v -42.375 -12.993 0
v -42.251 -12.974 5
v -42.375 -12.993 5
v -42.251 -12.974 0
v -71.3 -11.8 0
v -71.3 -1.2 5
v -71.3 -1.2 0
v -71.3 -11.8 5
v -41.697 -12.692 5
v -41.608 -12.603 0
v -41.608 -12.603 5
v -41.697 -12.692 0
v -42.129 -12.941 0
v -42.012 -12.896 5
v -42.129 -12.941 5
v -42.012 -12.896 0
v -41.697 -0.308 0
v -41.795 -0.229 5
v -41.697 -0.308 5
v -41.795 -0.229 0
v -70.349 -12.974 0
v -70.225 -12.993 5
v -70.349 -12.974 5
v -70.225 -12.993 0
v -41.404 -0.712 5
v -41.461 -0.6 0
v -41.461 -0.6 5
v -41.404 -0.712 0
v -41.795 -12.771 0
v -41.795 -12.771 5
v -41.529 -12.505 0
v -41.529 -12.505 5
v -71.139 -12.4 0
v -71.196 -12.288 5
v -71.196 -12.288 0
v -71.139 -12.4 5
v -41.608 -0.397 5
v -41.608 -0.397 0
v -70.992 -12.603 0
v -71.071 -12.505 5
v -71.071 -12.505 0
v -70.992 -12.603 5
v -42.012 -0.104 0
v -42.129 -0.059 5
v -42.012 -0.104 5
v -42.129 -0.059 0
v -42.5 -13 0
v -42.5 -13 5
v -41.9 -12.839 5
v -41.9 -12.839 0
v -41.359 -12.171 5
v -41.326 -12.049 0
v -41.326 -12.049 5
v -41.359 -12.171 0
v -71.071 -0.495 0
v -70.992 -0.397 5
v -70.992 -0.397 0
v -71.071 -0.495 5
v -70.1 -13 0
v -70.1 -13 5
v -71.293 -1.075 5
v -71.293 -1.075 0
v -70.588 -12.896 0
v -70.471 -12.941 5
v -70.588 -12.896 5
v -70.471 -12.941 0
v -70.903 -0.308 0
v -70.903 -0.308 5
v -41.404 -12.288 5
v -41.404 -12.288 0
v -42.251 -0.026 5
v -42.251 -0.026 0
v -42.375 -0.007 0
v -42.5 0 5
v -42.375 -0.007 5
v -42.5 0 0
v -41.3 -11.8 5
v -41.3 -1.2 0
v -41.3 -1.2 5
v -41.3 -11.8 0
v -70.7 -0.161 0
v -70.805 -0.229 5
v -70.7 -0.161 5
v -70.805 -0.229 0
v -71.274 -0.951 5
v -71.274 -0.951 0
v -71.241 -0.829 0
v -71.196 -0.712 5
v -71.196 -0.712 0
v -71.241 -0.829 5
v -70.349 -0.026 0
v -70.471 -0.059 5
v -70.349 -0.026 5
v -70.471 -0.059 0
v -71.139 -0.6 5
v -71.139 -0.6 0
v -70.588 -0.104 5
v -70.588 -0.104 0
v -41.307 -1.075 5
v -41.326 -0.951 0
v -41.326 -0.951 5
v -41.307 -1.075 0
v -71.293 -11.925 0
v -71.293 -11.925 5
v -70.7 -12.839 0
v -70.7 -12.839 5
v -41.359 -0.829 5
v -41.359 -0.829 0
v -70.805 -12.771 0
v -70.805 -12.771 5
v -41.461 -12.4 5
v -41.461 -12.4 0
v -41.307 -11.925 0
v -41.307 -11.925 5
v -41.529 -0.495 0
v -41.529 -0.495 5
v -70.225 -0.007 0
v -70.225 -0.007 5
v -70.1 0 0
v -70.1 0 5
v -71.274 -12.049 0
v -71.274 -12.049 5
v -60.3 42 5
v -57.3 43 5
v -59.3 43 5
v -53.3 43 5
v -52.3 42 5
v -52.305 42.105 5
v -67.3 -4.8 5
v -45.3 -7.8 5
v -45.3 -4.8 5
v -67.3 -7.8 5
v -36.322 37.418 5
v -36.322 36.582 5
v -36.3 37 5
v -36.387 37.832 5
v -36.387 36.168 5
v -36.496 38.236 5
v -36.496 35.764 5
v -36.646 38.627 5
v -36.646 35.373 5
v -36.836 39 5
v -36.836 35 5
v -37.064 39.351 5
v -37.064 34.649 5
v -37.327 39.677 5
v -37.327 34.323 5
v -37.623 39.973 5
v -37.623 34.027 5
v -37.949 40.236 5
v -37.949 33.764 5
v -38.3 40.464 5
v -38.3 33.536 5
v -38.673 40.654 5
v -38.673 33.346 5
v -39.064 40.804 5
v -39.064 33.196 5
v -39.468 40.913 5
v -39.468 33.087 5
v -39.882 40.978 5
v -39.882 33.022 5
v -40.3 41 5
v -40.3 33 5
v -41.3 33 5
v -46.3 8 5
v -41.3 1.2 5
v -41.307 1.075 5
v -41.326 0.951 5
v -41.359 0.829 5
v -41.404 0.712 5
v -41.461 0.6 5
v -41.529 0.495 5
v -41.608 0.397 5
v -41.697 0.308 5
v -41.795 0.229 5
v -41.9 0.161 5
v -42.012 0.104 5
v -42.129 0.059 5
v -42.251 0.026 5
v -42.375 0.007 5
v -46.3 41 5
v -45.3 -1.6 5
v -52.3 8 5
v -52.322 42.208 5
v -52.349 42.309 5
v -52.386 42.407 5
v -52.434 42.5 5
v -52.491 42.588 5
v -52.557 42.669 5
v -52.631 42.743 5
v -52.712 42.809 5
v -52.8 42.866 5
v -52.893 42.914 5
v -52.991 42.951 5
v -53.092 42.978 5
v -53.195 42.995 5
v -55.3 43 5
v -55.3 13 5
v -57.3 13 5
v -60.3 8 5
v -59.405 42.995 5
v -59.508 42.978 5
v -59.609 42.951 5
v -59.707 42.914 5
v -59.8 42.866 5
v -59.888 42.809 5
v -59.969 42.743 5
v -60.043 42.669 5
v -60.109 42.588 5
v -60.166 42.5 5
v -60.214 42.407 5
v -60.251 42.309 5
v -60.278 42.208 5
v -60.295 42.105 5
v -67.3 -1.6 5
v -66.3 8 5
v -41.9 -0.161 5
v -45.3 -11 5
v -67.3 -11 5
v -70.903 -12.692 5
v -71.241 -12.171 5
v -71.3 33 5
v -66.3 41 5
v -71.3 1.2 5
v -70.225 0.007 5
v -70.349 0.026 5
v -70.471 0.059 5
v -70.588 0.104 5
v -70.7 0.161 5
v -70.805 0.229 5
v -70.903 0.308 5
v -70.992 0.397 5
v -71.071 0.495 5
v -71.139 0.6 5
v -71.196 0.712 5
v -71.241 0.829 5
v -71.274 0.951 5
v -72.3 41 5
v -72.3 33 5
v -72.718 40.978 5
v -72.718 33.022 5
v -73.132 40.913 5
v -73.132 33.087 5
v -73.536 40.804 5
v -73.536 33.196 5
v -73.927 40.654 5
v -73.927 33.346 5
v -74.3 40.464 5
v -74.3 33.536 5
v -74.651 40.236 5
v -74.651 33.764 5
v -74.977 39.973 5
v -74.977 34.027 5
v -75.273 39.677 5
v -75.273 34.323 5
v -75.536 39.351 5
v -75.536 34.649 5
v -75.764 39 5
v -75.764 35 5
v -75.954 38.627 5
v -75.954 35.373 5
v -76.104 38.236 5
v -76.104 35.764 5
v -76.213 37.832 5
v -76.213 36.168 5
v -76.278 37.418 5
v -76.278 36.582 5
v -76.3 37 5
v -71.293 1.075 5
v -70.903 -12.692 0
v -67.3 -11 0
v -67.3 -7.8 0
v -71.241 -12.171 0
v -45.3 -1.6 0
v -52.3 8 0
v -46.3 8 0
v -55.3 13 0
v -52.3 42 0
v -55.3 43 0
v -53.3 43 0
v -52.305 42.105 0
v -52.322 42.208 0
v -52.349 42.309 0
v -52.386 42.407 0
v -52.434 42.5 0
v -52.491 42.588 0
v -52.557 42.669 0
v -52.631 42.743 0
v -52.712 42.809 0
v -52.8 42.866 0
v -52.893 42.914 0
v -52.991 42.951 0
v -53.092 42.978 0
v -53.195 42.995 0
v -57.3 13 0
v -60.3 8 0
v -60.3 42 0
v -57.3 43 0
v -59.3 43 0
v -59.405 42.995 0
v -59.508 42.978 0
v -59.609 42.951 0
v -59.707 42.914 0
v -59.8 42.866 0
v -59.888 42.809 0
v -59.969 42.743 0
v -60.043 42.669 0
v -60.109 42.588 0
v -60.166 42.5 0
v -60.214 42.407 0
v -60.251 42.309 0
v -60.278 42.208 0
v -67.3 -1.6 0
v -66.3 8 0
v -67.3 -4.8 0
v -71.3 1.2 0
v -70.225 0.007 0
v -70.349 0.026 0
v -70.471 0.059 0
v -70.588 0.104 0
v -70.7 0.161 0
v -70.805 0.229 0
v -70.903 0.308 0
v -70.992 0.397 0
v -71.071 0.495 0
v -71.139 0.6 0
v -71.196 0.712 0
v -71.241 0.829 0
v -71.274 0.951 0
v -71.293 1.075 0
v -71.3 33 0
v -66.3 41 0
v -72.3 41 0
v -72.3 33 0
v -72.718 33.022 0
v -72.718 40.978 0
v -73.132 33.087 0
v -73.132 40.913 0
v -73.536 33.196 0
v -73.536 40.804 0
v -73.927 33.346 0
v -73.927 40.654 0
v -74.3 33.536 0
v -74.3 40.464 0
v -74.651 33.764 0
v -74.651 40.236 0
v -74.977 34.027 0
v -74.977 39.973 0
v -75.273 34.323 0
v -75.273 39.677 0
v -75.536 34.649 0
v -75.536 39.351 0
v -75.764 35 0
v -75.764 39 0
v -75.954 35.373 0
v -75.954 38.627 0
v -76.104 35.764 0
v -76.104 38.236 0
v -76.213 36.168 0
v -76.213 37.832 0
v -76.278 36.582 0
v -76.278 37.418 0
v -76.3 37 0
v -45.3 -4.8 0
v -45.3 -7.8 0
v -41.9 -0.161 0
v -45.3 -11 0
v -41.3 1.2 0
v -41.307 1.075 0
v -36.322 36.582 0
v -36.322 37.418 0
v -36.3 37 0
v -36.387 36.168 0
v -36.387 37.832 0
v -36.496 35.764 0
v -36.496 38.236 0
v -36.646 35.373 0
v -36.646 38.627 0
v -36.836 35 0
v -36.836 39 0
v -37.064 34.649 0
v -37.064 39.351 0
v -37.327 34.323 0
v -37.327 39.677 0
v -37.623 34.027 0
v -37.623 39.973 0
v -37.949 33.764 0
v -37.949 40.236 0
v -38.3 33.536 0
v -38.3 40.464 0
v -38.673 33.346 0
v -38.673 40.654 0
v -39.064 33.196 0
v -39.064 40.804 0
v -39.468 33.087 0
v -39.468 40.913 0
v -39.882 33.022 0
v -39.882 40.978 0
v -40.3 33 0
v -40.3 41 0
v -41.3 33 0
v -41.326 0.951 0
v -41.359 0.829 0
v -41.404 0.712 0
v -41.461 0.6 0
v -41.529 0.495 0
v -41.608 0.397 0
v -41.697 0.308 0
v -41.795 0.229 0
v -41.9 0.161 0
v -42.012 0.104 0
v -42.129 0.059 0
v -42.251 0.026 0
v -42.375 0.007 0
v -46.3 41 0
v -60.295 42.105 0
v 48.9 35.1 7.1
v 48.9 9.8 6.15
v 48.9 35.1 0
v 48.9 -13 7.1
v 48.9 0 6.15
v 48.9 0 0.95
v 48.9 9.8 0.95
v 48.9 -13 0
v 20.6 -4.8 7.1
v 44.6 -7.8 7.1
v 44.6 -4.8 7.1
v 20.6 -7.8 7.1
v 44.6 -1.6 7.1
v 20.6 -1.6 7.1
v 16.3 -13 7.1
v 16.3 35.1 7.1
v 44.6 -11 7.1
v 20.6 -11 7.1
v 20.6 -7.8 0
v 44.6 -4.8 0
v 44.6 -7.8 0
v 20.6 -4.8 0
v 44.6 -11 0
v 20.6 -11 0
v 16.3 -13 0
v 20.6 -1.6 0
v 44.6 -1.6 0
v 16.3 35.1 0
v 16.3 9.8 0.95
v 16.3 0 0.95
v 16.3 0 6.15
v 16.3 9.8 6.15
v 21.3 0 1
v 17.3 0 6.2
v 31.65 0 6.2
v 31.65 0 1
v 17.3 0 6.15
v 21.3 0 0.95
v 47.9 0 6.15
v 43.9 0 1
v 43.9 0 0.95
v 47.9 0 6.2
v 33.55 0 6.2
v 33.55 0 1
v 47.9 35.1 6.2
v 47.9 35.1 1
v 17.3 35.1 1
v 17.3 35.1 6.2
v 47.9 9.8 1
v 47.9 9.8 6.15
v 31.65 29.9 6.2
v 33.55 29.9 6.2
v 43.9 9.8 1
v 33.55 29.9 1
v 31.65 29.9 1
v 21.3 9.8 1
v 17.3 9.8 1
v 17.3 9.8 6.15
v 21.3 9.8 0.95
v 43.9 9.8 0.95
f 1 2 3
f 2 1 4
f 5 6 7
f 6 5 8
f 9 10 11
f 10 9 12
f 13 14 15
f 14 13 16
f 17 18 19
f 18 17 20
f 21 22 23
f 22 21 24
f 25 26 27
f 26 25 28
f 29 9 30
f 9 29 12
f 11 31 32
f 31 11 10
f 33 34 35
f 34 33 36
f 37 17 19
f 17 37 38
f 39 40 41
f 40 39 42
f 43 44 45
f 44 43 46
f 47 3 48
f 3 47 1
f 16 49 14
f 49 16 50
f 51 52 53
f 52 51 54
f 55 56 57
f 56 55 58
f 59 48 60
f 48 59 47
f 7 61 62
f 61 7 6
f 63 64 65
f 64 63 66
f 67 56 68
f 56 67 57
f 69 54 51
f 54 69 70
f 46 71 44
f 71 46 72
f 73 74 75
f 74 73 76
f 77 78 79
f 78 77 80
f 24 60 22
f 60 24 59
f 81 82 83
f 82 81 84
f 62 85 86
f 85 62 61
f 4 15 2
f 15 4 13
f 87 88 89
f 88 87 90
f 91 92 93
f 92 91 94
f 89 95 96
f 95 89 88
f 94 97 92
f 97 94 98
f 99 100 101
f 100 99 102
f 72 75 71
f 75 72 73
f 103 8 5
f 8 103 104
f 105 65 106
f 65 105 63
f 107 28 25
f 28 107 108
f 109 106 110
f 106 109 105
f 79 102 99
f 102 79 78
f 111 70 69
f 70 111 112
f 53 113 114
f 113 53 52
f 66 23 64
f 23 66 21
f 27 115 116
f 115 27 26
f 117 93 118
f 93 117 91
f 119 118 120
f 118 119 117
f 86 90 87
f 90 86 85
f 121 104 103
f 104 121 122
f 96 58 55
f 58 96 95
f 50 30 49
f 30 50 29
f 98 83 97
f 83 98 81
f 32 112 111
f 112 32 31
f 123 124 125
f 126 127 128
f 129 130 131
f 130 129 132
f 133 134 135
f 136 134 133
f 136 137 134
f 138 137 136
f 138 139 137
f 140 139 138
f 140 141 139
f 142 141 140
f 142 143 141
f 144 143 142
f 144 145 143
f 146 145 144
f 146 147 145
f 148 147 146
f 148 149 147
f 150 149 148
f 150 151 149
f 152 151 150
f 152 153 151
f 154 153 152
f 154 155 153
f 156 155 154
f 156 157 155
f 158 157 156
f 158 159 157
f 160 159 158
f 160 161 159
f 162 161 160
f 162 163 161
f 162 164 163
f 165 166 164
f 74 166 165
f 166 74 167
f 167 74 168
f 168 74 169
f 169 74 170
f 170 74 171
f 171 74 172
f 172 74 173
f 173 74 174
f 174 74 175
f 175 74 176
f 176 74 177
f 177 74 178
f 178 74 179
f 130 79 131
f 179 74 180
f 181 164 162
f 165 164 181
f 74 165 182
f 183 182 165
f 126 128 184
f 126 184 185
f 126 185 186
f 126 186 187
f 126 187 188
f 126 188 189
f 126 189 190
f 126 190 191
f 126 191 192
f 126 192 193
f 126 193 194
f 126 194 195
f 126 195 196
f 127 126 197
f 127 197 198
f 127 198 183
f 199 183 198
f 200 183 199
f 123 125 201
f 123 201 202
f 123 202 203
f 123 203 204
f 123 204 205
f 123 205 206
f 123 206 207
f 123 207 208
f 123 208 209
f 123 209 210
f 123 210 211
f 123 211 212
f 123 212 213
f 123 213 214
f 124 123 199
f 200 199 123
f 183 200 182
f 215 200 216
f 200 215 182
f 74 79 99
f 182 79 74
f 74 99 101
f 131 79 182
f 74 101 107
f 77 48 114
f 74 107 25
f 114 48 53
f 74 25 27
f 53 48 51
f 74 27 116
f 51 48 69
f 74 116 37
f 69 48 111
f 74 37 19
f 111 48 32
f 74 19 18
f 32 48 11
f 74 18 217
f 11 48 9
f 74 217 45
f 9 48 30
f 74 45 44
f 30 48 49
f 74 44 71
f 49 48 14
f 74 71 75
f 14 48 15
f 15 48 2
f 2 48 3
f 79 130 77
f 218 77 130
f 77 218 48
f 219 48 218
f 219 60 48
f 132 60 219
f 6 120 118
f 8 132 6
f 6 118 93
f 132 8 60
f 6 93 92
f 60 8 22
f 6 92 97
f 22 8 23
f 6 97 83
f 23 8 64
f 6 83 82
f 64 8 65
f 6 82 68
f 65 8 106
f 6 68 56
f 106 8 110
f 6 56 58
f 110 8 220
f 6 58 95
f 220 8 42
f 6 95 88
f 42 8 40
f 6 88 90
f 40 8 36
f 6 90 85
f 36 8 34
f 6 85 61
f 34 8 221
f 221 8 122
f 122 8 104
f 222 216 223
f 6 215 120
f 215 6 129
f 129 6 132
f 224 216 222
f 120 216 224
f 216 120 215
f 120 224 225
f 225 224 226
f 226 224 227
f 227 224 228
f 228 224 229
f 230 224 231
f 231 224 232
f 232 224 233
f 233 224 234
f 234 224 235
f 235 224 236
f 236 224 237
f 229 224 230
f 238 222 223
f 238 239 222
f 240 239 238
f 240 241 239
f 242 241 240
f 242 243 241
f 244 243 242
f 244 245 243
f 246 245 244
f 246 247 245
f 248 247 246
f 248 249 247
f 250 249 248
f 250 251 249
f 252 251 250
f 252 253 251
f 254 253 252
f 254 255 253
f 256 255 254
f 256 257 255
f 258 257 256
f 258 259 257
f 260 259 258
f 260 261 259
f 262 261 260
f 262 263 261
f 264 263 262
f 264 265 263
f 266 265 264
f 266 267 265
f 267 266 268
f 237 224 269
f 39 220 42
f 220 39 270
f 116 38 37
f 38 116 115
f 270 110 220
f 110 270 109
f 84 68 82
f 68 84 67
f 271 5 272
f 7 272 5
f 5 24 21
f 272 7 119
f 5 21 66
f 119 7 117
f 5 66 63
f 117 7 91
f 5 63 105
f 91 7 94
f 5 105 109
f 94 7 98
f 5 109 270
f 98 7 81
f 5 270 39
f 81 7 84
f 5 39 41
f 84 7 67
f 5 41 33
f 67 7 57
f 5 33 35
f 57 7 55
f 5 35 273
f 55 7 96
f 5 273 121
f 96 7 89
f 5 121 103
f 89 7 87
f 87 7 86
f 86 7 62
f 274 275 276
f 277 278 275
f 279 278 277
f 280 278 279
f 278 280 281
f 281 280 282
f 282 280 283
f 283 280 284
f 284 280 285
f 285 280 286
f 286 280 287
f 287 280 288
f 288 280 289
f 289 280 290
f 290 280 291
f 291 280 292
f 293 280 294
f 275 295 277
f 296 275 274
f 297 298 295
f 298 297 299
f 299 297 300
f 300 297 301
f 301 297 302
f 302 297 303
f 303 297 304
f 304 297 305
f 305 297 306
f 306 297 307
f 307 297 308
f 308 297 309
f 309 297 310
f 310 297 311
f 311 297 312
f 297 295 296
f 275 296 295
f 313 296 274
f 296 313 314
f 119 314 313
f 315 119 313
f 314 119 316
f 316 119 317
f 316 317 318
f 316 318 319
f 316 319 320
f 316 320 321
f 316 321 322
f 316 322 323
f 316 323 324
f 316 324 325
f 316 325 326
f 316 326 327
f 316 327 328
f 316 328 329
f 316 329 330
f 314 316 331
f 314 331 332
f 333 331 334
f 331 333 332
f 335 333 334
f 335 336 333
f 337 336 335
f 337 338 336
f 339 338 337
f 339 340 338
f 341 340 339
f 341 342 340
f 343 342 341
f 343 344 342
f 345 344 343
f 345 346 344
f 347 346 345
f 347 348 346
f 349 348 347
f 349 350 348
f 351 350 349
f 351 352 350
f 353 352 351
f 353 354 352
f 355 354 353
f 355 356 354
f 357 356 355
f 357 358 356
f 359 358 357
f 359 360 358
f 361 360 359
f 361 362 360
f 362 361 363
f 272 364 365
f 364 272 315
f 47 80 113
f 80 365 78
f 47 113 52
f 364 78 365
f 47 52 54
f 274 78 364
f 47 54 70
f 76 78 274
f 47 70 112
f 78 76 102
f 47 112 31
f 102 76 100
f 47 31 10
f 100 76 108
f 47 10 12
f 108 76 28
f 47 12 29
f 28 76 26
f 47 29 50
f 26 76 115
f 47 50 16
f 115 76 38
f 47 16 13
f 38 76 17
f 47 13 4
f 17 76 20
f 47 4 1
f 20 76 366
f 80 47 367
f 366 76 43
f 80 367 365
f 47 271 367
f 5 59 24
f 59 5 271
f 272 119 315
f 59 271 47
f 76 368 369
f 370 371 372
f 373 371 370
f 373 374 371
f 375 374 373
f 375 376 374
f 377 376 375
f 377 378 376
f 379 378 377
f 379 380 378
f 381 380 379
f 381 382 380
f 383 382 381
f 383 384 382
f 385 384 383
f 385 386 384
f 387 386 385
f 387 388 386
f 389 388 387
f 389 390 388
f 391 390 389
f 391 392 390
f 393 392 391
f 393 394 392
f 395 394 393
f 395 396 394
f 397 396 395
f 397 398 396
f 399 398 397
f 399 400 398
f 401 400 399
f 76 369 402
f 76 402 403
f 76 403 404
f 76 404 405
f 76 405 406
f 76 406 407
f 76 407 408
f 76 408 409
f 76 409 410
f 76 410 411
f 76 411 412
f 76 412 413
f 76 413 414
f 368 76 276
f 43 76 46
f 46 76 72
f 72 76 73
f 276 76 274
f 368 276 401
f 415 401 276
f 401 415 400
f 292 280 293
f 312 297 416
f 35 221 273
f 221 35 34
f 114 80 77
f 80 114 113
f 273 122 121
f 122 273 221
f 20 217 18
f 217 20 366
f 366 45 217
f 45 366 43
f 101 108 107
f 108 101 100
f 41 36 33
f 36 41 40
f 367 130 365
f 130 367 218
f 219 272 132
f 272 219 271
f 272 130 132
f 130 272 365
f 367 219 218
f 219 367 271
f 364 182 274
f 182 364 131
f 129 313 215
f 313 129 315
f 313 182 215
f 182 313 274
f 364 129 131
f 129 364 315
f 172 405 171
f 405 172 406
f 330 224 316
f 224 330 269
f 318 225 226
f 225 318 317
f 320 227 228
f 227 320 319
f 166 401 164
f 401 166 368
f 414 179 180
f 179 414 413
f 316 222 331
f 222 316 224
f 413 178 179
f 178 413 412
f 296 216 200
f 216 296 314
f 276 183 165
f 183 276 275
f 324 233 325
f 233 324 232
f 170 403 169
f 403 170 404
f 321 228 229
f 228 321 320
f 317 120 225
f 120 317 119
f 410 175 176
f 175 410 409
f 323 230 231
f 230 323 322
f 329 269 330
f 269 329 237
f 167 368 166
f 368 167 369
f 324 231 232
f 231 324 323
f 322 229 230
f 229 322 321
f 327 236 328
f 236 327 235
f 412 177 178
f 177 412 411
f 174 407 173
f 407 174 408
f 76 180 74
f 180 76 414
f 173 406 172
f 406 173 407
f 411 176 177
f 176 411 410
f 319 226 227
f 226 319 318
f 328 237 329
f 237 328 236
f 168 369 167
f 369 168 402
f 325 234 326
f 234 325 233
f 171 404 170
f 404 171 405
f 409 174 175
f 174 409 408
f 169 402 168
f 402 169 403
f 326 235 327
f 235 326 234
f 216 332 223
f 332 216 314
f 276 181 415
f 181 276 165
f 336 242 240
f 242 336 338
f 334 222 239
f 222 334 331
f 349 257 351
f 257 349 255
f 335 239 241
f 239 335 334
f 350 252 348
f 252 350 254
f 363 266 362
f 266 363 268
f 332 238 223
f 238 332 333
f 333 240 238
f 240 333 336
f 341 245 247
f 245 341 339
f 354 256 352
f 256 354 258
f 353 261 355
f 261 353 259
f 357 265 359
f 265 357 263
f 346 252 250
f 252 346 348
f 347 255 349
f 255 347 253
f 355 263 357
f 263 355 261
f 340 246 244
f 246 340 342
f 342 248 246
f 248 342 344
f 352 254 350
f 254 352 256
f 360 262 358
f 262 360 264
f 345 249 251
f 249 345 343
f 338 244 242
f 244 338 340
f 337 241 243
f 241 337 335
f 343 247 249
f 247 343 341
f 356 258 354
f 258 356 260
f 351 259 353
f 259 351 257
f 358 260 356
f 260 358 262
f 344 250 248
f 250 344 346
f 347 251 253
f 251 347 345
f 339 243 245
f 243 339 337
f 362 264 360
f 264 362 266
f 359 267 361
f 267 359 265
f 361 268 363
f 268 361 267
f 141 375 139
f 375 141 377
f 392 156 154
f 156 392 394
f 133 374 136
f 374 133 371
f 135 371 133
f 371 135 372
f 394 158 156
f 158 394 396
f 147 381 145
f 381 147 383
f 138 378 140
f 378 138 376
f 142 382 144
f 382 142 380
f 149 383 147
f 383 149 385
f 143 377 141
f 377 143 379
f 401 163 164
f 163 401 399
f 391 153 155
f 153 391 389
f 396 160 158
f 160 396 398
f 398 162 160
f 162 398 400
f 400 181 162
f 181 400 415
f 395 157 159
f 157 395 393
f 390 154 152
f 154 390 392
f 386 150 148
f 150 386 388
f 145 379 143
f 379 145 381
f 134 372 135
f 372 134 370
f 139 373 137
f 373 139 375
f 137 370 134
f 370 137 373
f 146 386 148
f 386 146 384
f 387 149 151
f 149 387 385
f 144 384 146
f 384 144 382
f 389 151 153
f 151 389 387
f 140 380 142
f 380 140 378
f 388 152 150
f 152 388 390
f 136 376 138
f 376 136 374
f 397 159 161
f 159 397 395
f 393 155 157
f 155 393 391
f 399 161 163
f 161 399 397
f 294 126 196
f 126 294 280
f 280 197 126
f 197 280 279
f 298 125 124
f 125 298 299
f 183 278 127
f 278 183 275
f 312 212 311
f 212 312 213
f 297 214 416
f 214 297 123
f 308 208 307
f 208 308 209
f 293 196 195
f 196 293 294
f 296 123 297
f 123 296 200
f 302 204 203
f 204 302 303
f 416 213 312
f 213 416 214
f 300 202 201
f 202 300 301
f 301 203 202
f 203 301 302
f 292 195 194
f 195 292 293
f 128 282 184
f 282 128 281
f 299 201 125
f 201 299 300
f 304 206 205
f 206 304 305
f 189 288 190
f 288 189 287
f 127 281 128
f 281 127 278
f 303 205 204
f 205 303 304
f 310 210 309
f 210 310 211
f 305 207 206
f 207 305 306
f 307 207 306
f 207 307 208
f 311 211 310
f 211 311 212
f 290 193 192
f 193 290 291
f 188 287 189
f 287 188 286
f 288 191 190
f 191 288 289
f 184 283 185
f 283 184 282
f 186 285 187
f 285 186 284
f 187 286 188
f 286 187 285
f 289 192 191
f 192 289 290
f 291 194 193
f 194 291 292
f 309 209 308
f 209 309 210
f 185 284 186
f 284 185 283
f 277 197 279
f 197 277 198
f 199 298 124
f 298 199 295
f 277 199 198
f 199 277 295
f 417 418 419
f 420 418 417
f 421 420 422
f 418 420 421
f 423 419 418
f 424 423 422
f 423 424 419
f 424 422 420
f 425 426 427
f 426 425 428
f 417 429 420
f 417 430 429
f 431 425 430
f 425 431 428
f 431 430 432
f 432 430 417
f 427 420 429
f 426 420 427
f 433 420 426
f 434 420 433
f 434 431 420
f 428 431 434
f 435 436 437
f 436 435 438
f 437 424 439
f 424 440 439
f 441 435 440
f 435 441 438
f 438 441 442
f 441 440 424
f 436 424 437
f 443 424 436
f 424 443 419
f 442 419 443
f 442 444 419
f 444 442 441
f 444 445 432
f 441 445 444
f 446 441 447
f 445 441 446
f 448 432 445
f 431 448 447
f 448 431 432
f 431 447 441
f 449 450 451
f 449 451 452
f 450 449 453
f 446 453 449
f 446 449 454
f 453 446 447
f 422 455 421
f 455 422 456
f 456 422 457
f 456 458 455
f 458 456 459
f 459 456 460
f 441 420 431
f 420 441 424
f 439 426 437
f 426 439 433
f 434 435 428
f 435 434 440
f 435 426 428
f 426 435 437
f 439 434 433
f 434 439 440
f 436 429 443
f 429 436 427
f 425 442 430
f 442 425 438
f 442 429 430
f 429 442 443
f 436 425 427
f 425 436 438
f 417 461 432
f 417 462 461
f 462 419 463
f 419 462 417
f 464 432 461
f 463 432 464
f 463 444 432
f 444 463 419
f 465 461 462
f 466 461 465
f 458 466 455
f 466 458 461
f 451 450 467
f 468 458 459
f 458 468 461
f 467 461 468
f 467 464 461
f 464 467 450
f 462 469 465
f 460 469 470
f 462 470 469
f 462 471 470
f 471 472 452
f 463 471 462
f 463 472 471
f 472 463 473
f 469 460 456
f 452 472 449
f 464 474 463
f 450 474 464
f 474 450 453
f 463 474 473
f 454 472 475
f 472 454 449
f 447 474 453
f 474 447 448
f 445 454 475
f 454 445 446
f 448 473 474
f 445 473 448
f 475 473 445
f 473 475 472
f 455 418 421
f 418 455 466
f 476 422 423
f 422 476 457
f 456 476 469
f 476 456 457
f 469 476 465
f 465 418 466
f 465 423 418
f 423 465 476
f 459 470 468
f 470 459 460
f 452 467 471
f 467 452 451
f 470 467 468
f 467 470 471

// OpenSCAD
// connector_combined.scad
// Combined snap buckle connector.
// Includes:
// - male connector with side arms and half-circle locking heads
// - female receiver with strap holder, center rail, and side locking holes

$fn = 60;


// ============================================================
// Preview layout
// ============================================================

preview_gap = 25;


// ============================================================
// Shared helper module
// ============================================================

module rounded_box(size=[10,10,4], r=1) {
    hull() {
        translate([r, r, 0])
            cylinder(h=size[2], r=r);

        translate([size[0]-r, r, 0])
            cylinder(h=size[2], r=r);

        translate([r, size[1]-r, 0])
            cylinder(h=size[2], r=r);

        translate([size[0]-r, size[1]-r, 0])
            cylinder(h=size[2], r=r);
    }
}


// ============================================================
// Male connector parameters
// ============================================================

male_thickness = 5;

male_base_width  = 30;
male_base_depth  = 8;


// ------------------------------------------------------------
// Male strap holder base
// ------------------------------------------------------------

male_strap_base_width = 30;
male_strap_base_height = 13;
male_strap_base_depth = 5;

male_strap_slot_width = 22;
male_strap_slot_height = 3.2;
male_strap_bar_height = 3;


// ------------------------------------------------------------
// Male side arms
// ------------------------------------------------------------

male_arm_width = 5;
male_arm_total_length = 34;


// ------------------------------------------------------------
// Male half-circle locking heads
// ------------------------------------------------------------

male_head_length = 6;
male_head_height = 8;

male_arm_body_length = male_arm_total_length - male_head_height;

male_head_overlap = 1.0;


// ------------------------------------------------------------
// Male center guide
// ------------------------------------------------------------

male_center_width = 8;
male_center_length = 35;

male_slot_width = 2;
male_slot_margin_bottom = 5;


// ------------------------------------------------------------
// Male general settings
// ------------------------------------------------------------

male_arm_overlap_into_base = 1.5;
male_rounding = 1.2;


// ============================================================
// Male locking head modules
// ============================================================

module left_half_circle_head_2d(length, height) {
    union() {
        // Flat part
        translate([-length, -height / 2])
            square([length, height]);

        // Rounded outside end
        translate([-length, 0])
            circle(d = height);
    }
}


module right_half_circle_head_2d(length, height) {
    union() {
        // Flat part
        translate([0, -height / 2])
            square([length, height]);

        // Rounded outside end
        translate([length, 0])
            circle(d = height);
    }
}


module left_half_circle_head(length, height, thickness) {
    linear_extrude(height = thickness)
        left_half_circle_head_2d(length, height);
}


module right_half_circle_head(length, height, thickness) {
    linear_extrude(height = thickness)
        right_half_circle_head_2d(length, height);
}


// ============================================================
// Male connector
// ============================================================

module male_connector() {

    difference() {

        union() {

            // Bag-style strap holder base
            difference() {
                translate([-male_strap_base_width / 2, -male_strap_base_height, 0])
                    rounded_box(
                        [
                            male_strap_base_width,
                            male_strap_base_height,
                            male_strap_base_depth
                        ],
                        r = male_rounding
                    );

                // First strap slot
                translate([
                    -male_strap_slot_width / 2,
                    -male_strap_base_height + 2,
                    -0.1
                ])
                    cube([
                        male_strap_slot_width,
                        male_strap_slot_height,
                        male_strap_base_depth + 0.2
                    ]);

                // Second strap slot
                translate([
                    -male_strap_slot_width / 2,
                    -male_strap_base_height + 2 + male_strap_slot_height + male_strap_bar_height,
                    -0.1
                ])
                    cube([
                        male_strap_slot_width,
                        male_strap_slot_height,
                        male_strap_base_depth + 0.2
                    ]);
            }


            // Front base bridge
            translate([-male_base_width / 2, 0, 0])
                rounded_box(
                    [
                        male_base_width,
                        male_base_depth,
                        male_thickness
                    ],
                    r = male_rounding
                );


            // Left flexible arm
            translate([
                -male_base_width / 2,
                male_base_depth - male_arm_overlap_into_base,
                0
            ])
                cube([
                    male_arm_width,
                    male_arm_body_length + male_arm_overlap_into_base,
                    male_thickness
                ]);


            // Right flexible arm
            translate([
                male_base_width / 2 - male_arm_width,
                male_base_depth - male_arm_overlap_into_base,
                0
            ])
                cube([
                    male_arm_width,
                    male_arm_body_length + male_arm_overlap_into_base,
                    male_thickness
                ]);


            // Left half-circle locking head
            translate([
                -male_base_width / 2 + male_arm_width,
                male_base_depth + male_arm_body_length - male_head_overlap + male_head_height / 2,
                0
            ])
                left_half_circle_head(
                    male_head_length,
                    male_head_height,
                    male_thickness
                );


            // Right half-circle locking head
            translate([
                male_base_width / 2 - male_arm_width,
                male_base_depth + male_arm_body_length - male_head_overlap + male_head_height / 2,
                0
            ])
                right_half_circle_head(
                    male_head_length,
                    male_head_height,
                    male_thickness
                );


            // Center guide
            translate([
                -male_center_width / 2,
                male_base_depth - male_arm_overlap_into_base,
                0
            ])
                rounded_box(
                    [
                        male_center_width,
                        male_center_length + male_arm_overlap_into_base,
                        male_thickness
                    ],
                    r = 1
                );
        }


        // Open-top straight slot in center guide
        translate([
            -male_slot_width / 2,
            male_base_depth + male_slot_margin_bottom,
            -0.1
        ])
            cube([
                male_slot_width,
                male_center_length + 5,
                male_thickness + 0.2
            ]);
    }
}


// ============================================================
// Female connector parameters
// ============================================================

female_main_width = 32.6;
female_main_height = 35.1;
female_main_depth = 7.1;


// ------------------------------------------------------------
// Female internal receiver cutout
// ------------------------------------------------------------

female_cut_width = 30.6;
female_cut_height = 35.1;
female_cut_depth = 5.1;


// ------------------------------------------------------------
// Female center guide rail
// ------------------------------------------------------------

female_line_width = 1.9;
female_line_height = 29.9;
female_line_depth = 7.1;


// ------------------------------------------------------------
// Female strap holder base
// ------------------------------------------------------------

female_base_width = 32.6;
female_base_height = 13;
female_base_depth = 7.1;

female_strap_slot_width = 24;
female_strap_slot_height = 3.2;
female_strap_bar_height = 3;


// ------------------------------------------------------------
// Female side locking openings
// ------------------------------------------------------------

female_side_hole_width = 5;
female_side_hole_height = 9.8;
female_side_hole_depth = 5.2;


// ============================================================
// Female connector
// ============================================================

module female_connector() {

    union() {

        // ----------------------------------------------------
        // Strap holder base
        // ----------------------------------------------------

        difference() {

            // Solid base block behind the receiver
            translate([0, -female_base_height, 0])
                cube([
                    female_base_width,
                    female_base_height,
                    female_base_depth
                ]);


            // First strap slot
            translate([
                (female_base_width - female_strap_slot_width) / 2,
                -female_base_height + 2,
                -0.1
            ])
                cube([
                    female_strap_slot_width,
                    female_strap_slot_height,
                    female_base_depth + 0.2
                ]);


            // Second strap slot
            translate([
                (female_base_width - female_strap_slot_width) / 2,
                -female_base_height + 2 + female_strap_slot_height + female_strap_bar_height,
                -0.1
            ])
                cube([
                    female_strap_slot_width,
                    female_strap_slot_height,
                    female_base_depth + 0.2
                ]);
        }


        // ----------------------------------------------------
        // Female receiver body
        // ----------------------------------------------------

        difference() {

            // Outer receiver block
            cube([
                female_main_width,
                female_main_height,
                female_main_depth
            ]);


            // Main internal cutout
            // This creates the tunnel for the male connector.
            translate([
                (female_main_width - female_cut_width) / 2,
                (female_main_height - female_cut_height) / 2,
                (female_main_depth - female_cut_depth) / 2
            ])
                cube([
                    female_cut_width,
                    female_cut_height,
                    female_cut_depth + 0.1
                ]);


            // Left side locking opening
            // Starts at the entrance side of the receiver.
            translate([
                -0.1,
                0,
                (female_main_depth - female_side_hole_depth) / 2
            ])
                cube([
                    female_side_hole_width + 0.1,
                    female_side_hole_height,
                    female_side_hole_depth
                ]);


            // Right side locking opening
            // Starts at the entrance side of the receiver.
            translate([
                female_main_width - female_side_hole_width,
                0,
                (female_main_depth - female_side_hole_depth) / 2
            ])
                cube([
                    female_side_hole_width + 0.1,
                    female_side_hole_height,
                    female_side_hole_depth
                ]);
        }


        // ----------------------------------------------------
        // Center guide rail
        // ----------------------------------------------------

        // This rail fits into the slot of the male connector.
        translate([
            (female_main_width - female_line_width) / 2,
            0,
            0
        ])
            cube([
                female_line_width,
                female_line_height,
                female_line_depth
            ]);
    }
}


// ============================================================
// Final layout
// ============================================================

// Male part on the left
translate([
    -male_base_width / 2 - female_main_width / 2 - preview_gap,
    0,
    0
])
    male_connector();


// Female part on the right
translate([
    female_main_width / 2,
    0,
    0
])
    female_connector();
